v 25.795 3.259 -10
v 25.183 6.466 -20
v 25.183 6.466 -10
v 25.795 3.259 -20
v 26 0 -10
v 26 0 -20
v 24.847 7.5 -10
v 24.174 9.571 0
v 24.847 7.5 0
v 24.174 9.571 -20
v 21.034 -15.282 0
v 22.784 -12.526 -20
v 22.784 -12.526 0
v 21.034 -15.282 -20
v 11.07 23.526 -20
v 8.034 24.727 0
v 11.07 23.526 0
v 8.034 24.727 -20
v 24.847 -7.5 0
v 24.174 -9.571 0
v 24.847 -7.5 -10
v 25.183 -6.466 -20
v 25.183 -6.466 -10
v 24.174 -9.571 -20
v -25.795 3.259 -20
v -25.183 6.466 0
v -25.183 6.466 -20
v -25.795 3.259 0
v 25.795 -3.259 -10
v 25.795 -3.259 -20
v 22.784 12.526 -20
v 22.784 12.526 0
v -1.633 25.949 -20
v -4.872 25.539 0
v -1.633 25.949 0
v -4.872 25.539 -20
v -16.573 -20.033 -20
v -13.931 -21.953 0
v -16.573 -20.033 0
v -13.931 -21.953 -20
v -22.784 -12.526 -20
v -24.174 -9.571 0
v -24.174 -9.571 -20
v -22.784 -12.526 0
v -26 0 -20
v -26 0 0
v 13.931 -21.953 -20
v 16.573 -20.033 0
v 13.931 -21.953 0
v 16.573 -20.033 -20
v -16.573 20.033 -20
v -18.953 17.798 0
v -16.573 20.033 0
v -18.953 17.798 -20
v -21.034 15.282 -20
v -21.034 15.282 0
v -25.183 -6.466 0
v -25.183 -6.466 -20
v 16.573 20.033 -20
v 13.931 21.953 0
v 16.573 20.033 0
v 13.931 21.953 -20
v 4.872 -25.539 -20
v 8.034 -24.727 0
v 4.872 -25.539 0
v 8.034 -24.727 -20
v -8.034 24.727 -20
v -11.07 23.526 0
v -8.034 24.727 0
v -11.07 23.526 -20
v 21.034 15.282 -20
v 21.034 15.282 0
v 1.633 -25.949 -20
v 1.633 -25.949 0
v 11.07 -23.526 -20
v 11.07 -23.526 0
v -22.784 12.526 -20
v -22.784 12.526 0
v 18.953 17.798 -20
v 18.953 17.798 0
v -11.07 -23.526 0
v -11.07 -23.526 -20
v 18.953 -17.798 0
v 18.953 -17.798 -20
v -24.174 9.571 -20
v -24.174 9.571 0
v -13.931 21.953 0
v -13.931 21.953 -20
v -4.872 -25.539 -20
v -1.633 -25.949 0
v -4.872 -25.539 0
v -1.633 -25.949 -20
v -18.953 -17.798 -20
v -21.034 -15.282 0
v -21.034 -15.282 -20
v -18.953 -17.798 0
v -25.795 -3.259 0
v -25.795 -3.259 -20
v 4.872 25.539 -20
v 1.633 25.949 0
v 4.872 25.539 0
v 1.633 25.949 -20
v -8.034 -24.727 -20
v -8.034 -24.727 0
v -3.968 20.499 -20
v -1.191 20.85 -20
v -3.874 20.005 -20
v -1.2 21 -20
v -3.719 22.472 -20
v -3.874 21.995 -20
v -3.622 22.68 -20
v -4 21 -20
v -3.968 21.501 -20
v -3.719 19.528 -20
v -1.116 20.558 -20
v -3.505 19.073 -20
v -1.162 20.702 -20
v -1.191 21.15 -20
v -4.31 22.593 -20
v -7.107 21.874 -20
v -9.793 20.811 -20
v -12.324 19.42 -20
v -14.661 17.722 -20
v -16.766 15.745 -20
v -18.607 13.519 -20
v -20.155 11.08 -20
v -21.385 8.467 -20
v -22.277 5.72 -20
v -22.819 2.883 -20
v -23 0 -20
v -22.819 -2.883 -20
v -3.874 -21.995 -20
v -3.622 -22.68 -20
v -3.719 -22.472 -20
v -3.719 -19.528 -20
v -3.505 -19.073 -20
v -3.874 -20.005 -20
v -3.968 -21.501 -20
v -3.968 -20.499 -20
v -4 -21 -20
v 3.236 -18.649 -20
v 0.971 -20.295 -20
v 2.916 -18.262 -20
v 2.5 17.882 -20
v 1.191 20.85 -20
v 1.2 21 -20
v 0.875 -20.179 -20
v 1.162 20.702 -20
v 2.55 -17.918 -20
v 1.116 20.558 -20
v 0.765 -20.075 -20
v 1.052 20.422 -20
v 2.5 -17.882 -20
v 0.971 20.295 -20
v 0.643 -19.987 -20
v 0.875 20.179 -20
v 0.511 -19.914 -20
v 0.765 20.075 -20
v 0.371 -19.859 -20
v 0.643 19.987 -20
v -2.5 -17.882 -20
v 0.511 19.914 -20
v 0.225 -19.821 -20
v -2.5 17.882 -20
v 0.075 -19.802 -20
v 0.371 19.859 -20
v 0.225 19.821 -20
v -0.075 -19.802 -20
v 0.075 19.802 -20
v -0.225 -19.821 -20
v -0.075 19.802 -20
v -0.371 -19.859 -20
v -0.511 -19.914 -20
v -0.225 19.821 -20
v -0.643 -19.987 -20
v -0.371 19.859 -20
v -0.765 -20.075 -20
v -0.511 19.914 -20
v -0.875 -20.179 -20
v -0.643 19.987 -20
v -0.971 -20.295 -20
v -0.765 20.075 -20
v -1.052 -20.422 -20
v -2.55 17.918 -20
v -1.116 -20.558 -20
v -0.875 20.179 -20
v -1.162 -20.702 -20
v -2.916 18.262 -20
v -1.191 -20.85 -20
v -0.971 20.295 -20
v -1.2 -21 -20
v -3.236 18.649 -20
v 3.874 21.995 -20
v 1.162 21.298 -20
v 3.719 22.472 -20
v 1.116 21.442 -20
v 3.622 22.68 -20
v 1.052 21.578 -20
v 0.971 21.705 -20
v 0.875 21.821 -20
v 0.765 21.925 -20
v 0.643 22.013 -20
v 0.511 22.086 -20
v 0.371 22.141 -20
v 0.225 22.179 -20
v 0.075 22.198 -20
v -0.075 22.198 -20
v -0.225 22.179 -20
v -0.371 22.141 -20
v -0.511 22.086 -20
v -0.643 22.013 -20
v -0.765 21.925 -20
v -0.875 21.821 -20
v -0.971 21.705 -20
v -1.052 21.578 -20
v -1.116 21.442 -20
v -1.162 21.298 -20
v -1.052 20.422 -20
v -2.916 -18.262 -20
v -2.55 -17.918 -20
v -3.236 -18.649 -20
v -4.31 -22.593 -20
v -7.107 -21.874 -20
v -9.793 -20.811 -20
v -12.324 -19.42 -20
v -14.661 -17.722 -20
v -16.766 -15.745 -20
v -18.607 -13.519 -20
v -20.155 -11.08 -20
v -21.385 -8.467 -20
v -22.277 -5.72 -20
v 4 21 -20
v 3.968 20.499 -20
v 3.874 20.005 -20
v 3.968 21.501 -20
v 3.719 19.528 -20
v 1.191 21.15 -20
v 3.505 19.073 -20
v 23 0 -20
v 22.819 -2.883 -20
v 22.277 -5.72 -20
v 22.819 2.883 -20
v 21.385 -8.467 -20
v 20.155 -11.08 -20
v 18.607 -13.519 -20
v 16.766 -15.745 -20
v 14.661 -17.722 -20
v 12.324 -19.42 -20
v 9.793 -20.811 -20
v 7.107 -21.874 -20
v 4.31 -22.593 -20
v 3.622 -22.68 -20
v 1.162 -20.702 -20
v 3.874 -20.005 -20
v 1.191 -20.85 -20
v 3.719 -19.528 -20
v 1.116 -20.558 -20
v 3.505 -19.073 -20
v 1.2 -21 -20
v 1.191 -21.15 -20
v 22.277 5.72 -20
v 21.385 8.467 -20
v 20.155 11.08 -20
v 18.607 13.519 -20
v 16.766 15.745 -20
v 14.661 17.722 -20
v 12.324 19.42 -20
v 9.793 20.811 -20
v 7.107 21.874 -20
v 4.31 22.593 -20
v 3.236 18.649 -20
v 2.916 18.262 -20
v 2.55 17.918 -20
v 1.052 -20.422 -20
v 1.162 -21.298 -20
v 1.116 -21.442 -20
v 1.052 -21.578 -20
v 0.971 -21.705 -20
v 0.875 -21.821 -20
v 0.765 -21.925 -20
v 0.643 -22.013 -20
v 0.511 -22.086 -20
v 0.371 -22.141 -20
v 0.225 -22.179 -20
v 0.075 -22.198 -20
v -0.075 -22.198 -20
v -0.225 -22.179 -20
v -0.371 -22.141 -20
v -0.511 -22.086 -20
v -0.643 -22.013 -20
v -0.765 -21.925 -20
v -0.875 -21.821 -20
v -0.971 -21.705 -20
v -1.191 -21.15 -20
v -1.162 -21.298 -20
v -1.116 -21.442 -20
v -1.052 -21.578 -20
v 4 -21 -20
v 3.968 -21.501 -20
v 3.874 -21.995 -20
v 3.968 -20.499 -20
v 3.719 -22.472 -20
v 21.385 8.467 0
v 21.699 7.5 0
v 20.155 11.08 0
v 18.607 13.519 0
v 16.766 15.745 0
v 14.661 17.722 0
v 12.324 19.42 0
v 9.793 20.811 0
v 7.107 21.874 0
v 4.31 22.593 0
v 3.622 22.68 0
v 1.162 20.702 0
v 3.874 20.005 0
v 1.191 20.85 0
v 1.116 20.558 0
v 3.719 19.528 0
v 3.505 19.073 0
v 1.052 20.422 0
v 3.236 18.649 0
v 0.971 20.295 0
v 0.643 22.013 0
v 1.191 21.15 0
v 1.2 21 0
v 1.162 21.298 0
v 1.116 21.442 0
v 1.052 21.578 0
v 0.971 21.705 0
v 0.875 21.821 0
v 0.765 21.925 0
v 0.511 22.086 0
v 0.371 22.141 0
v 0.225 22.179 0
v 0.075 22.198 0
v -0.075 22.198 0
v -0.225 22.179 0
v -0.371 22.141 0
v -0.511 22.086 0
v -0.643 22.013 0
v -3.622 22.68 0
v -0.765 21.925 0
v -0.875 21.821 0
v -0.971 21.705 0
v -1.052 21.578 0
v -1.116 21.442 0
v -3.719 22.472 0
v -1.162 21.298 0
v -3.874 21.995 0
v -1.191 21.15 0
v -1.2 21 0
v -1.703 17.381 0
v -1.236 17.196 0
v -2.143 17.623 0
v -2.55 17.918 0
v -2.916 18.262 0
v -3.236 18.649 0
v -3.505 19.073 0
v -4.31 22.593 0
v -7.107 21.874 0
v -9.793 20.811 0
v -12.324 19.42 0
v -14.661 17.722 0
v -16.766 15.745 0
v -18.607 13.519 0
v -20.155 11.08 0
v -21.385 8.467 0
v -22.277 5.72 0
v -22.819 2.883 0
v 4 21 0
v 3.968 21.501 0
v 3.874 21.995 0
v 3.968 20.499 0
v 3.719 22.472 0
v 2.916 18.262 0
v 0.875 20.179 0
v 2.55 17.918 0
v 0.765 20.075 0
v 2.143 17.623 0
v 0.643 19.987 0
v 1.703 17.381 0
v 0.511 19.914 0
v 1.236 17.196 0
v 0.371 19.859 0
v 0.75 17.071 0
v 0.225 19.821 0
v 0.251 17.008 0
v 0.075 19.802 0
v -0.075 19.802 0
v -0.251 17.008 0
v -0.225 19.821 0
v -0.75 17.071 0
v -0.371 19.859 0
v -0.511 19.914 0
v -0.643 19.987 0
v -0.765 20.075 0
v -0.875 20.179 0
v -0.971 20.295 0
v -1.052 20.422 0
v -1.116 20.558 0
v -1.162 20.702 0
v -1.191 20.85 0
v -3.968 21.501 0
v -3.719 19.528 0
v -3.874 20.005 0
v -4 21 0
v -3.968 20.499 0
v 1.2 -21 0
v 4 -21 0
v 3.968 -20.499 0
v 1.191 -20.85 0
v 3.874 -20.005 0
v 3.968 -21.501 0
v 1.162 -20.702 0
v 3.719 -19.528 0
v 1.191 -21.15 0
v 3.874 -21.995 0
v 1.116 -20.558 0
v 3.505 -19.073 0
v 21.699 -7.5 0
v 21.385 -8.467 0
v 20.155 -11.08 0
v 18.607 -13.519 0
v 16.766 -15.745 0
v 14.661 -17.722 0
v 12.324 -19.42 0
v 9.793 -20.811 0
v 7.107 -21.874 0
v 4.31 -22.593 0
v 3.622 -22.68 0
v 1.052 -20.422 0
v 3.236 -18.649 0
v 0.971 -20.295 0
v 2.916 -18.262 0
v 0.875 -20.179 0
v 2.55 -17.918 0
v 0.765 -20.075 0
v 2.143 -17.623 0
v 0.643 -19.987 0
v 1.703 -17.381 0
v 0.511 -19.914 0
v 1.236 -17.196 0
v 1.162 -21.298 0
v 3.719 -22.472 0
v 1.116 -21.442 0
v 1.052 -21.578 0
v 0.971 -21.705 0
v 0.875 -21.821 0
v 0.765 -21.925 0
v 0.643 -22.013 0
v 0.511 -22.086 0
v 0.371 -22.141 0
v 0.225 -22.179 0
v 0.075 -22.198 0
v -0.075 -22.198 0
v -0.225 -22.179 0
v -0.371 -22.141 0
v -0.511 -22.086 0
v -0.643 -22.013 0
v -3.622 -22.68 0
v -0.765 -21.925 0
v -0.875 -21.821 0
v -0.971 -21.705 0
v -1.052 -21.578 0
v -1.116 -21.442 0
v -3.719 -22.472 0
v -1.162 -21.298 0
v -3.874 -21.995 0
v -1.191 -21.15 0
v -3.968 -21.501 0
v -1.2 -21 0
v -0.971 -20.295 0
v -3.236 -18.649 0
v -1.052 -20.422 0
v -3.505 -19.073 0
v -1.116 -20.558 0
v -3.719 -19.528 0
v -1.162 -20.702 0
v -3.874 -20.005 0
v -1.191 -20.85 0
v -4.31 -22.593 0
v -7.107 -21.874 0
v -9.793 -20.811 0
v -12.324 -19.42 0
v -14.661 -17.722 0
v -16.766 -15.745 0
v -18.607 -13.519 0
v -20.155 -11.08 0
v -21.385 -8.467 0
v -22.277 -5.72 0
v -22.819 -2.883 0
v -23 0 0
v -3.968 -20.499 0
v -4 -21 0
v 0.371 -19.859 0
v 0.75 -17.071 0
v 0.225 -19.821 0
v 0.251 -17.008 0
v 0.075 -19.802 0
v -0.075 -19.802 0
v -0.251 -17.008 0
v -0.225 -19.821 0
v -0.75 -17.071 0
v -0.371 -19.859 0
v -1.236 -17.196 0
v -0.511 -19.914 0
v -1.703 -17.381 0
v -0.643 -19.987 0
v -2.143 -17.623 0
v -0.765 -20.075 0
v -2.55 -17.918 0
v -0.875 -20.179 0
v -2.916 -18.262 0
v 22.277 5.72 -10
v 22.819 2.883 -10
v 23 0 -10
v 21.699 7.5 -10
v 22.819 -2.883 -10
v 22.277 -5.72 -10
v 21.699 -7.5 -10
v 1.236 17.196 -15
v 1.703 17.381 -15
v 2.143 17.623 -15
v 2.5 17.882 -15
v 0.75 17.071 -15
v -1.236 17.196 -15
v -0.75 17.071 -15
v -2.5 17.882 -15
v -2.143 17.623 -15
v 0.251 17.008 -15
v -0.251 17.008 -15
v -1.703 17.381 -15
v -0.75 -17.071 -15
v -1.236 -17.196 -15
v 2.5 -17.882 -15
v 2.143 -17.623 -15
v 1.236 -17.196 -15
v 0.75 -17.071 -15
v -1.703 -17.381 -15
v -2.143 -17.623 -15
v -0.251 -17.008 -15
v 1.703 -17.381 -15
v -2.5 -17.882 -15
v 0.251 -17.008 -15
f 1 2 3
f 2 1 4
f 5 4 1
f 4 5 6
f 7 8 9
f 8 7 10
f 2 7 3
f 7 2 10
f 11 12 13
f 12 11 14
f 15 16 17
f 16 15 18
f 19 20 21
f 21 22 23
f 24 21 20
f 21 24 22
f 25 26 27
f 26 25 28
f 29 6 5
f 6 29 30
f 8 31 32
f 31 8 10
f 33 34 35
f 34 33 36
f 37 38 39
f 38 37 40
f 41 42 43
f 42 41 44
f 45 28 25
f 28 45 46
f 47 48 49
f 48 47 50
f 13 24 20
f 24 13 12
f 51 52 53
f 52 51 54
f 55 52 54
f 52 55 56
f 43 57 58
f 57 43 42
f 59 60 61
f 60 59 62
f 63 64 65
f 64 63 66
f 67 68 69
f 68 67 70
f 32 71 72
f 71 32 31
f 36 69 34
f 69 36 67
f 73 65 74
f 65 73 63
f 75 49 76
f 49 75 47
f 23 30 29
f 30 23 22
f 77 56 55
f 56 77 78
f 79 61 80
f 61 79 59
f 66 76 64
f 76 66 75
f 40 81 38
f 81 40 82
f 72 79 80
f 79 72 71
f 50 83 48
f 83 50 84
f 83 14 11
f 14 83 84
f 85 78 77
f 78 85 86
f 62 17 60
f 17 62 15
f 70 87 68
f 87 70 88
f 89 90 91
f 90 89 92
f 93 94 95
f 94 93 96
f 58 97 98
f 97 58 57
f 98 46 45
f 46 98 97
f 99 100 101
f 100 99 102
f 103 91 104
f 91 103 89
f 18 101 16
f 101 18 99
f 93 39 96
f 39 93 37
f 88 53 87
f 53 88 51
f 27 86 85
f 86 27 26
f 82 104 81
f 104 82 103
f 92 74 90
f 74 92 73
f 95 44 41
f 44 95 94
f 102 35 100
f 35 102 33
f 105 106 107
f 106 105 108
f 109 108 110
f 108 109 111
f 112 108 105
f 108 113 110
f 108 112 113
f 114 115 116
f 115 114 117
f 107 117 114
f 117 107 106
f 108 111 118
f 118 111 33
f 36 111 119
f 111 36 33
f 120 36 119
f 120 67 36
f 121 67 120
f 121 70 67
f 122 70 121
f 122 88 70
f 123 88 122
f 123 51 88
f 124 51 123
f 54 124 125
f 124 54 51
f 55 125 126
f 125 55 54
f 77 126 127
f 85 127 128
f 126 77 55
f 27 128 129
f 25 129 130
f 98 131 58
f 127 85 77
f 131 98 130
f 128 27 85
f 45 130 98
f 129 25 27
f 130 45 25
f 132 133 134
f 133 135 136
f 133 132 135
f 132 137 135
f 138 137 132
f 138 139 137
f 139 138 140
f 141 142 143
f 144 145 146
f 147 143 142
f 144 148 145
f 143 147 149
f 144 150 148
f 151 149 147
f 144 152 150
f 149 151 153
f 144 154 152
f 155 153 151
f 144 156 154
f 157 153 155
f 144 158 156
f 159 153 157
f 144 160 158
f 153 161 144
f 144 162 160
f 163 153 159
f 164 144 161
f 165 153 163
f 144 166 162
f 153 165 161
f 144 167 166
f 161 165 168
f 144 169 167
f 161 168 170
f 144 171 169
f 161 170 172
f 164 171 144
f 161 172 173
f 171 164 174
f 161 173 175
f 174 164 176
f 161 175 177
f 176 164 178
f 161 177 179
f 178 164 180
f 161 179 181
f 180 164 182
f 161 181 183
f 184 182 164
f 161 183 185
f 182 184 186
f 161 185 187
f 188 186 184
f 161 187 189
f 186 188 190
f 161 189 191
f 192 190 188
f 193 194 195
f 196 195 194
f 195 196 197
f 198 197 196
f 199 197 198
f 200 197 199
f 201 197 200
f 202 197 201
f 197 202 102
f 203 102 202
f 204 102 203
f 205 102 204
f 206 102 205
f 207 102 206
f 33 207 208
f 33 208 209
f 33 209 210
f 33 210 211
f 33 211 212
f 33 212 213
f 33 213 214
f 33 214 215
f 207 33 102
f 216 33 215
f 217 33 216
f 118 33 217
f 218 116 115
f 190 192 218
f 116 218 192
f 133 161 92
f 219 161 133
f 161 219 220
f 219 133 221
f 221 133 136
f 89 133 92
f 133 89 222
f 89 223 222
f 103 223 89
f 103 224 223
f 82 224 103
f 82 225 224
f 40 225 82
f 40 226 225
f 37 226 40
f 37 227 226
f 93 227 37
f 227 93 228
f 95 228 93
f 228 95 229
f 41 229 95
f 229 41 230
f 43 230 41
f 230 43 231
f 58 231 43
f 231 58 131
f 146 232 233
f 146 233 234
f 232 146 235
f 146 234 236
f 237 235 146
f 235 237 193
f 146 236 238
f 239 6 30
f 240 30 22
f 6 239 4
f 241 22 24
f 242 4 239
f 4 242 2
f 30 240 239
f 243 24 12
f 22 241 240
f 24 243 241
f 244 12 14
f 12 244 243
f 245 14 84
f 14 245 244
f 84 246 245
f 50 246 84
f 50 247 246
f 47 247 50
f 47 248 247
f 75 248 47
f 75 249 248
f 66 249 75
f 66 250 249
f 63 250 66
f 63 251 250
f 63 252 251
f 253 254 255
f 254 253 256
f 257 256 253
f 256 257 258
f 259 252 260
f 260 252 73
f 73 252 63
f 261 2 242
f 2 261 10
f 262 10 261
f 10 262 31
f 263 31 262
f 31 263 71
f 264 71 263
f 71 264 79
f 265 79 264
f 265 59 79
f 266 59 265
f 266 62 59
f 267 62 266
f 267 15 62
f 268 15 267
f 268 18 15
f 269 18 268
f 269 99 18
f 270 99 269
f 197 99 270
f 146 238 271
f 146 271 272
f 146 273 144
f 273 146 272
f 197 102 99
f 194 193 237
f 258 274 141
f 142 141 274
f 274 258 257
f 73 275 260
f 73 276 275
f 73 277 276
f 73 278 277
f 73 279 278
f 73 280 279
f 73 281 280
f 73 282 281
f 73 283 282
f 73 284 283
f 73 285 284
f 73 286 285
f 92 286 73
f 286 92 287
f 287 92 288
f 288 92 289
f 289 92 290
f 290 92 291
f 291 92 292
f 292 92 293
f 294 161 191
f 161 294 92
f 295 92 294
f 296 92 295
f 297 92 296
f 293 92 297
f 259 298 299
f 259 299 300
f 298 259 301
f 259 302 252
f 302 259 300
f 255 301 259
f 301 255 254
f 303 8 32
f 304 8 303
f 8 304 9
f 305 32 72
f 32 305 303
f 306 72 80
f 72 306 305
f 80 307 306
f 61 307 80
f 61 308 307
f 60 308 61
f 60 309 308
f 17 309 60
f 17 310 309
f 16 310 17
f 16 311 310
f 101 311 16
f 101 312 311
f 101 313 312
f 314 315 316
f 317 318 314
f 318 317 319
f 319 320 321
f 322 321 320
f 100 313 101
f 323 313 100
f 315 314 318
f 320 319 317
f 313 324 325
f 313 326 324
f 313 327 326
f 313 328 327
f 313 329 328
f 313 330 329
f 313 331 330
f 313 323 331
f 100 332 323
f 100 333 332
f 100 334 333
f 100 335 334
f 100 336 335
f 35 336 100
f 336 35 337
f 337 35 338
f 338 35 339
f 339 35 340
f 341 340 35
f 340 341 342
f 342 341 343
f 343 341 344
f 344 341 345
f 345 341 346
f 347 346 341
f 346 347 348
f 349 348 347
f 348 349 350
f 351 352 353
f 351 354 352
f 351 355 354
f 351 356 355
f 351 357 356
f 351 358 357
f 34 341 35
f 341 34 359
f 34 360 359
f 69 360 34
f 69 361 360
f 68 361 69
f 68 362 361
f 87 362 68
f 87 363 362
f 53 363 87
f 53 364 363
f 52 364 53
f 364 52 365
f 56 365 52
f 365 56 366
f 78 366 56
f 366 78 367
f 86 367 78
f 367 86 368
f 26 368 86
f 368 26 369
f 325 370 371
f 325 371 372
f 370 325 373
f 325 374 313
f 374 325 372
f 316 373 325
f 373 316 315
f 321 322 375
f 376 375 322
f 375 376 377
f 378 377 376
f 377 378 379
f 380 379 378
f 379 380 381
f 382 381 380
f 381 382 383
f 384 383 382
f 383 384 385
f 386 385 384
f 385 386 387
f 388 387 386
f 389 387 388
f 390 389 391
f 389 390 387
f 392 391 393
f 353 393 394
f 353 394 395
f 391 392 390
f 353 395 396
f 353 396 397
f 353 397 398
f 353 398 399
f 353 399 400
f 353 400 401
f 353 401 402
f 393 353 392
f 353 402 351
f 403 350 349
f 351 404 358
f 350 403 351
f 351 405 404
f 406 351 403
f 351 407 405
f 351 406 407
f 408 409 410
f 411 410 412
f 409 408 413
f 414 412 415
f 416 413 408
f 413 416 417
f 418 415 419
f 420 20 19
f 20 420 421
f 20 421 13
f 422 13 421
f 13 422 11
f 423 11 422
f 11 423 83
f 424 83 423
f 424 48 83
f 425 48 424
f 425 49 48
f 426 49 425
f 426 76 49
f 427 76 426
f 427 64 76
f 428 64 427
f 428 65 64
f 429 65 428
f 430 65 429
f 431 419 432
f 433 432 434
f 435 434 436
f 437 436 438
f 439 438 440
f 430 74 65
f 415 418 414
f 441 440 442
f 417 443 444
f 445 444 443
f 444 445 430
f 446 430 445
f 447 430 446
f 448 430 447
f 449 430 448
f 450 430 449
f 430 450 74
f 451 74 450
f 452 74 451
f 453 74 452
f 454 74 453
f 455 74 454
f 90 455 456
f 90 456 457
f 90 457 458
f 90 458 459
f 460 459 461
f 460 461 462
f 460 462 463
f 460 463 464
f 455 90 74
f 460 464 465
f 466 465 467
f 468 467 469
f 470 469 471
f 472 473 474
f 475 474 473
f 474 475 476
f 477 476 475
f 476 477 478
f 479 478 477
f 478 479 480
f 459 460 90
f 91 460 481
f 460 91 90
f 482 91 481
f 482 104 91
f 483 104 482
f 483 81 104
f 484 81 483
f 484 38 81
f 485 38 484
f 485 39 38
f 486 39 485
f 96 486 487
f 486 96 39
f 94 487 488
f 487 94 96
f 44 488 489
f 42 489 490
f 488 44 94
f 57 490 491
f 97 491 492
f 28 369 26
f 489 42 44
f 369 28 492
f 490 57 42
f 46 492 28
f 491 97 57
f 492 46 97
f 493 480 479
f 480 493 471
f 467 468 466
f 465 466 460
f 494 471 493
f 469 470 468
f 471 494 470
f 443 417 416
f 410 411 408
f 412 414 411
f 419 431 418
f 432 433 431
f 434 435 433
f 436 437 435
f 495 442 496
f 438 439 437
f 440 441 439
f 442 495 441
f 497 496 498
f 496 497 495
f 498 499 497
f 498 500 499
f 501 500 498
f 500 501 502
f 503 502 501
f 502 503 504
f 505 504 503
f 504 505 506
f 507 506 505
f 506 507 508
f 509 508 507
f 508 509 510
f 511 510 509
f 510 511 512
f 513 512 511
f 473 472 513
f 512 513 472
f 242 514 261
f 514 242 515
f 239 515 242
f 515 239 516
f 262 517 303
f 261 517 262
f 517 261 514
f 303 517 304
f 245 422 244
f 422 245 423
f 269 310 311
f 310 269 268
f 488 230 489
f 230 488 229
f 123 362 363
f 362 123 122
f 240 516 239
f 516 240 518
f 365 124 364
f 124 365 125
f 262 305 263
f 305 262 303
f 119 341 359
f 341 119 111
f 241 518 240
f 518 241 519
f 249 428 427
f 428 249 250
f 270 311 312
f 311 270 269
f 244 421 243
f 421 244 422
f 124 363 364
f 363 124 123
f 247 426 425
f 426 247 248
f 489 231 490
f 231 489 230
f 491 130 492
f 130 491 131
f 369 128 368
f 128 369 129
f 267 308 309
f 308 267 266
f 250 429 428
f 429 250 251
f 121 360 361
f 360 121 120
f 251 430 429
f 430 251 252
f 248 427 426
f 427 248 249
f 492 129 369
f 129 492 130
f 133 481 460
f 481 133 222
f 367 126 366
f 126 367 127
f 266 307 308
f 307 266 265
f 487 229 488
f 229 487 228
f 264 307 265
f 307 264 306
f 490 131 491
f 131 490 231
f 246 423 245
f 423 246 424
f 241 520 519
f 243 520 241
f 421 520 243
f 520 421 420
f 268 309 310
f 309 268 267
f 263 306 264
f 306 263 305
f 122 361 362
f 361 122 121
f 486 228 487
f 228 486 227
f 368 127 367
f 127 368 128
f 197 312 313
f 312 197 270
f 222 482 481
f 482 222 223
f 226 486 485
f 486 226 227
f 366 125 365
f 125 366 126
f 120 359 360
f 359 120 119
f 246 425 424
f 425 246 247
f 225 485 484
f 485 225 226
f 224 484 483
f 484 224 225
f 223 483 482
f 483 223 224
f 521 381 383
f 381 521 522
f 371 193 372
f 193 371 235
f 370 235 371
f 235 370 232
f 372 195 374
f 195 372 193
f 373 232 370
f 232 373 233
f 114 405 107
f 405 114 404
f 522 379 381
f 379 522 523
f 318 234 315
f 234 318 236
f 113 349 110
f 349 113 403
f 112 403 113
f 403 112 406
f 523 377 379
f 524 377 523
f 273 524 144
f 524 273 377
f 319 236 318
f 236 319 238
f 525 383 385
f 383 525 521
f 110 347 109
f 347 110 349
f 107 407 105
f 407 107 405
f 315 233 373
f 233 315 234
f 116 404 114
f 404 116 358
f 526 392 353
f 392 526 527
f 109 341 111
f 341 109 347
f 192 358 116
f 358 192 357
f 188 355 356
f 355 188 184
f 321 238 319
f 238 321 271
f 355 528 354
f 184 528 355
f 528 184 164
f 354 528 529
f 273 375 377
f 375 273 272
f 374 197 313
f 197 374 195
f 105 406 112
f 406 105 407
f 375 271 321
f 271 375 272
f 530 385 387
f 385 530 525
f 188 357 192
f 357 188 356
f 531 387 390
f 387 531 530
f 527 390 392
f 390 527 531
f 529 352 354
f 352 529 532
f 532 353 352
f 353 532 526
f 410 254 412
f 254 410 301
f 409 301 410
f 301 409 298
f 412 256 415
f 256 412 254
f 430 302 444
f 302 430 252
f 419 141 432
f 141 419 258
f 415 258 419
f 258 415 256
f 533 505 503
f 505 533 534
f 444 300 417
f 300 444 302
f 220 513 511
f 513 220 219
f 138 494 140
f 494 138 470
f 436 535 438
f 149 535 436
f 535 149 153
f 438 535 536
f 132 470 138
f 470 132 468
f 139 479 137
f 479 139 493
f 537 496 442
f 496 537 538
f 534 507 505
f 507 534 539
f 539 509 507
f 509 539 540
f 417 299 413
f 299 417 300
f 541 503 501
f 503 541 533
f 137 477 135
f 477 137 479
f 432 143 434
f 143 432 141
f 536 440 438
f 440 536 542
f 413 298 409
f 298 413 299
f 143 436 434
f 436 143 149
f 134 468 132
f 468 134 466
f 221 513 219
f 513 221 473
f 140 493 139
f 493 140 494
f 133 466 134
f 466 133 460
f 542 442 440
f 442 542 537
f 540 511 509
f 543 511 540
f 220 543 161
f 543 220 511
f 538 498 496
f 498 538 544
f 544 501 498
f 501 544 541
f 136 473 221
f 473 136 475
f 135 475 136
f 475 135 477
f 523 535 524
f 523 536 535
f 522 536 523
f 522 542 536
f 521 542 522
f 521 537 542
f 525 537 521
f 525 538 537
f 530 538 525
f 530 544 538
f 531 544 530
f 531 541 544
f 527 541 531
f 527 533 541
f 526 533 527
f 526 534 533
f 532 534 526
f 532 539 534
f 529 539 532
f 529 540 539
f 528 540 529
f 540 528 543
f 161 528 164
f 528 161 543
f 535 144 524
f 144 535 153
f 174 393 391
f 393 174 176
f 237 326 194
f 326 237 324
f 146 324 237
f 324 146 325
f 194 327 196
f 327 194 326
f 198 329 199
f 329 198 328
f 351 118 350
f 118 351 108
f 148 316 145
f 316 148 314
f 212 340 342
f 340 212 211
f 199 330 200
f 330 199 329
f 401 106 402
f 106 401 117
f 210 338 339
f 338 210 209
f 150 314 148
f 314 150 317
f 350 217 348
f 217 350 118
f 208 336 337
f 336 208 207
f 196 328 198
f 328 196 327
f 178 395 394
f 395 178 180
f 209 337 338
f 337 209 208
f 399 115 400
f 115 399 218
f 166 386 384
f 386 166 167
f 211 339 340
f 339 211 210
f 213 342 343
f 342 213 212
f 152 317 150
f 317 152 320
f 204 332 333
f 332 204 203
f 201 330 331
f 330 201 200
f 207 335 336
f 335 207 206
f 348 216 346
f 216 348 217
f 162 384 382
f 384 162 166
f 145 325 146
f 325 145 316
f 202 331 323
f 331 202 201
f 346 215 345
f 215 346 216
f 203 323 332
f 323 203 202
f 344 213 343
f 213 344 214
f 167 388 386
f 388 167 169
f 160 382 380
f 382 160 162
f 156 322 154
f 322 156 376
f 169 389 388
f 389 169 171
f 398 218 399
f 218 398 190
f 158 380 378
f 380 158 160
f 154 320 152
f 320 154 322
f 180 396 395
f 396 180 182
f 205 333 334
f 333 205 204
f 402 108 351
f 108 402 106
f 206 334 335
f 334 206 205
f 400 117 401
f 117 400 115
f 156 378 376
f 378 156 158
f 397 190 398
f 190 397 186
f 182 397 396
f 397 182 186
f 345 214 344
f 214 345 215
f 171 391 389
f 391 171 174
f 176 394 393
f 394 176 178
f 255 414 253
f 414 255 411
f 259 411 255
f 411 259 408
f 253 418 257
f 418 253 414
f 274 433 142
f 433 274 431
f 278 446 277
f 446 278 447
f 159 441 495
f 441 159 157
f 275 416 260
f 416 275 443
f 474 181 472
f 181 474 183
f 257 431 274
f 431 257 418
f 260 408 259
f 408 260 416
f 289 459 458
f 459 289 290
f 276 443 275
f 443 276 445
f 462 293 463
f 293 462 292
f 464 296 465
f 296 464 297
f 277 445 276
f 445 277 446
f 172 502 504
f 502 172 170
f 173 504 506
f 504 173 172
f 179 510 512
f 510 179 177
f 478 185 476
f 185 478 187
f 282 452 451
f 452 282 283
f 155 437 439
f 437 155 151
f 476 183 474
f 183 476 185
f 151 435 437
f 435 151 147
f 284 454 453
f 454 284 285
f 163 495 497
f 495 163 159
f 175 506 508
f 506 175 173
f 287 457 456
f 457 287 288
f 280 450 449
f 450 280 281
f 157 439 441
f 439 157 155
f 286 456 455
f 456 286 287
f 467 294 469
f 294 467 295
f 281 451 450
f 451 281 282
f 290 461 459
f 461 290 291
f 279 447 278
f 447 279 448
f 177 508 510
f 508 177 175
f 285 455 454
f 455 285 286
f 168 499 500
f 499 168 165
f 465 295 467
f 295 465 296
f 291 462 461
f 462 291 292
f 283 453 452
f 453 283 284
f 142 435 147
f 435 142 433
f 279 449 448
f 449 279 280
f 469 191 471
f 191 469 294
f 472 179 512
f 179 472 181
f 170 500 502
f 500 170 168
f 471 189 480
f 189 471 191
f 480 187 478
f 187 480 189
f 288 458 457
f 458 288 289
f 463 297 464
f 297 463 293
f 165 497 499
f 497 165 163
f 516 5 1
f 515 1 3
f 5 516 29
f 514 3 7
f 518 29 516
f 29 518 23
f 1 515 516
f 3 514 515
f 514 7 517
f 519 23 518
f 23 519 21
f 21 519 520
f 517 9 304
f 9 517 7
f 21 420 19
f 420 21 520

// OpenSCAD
$fn = 50;

podRadius = 52/2;
podDepth = 20;
podHoleRadius = 23;
bezelRadius = podRadius + 5;
bezelHeight = 10;

// Adafruit 1.8" display with EYESPI
boardWidth = 57;
boardDepth = 36;
boardThickness = 6.5;
holeX = 25.5;
holeY = 15;
cornerRadius = 6;

boltPosition = 21;

/*
// zio.cc 1.5"
screenWidth = 30;
screenDepth = 34;
screenThickness = 1.5;

boardWidth = 45;
boardDepth = 36;
boardThickness = 1;
*/

module top()
{
    difference() {
        hull() {
            translate([0, 0, bezelHeight / 2])
                cylinder(h = bezelHeight, r = bezelRadius, center = true);
            
            translate([holeX, holeY, bezelHeight / 2])
                cylinder(h = bezelHeight, r = cornerRadius, center = true);
            translate([-holeX, holeY, bezelHeight / 2])
                cylinder(h = bezelHeight, r = cornerRadius, center = true);
            translate([holeX, -holeY, bezelHeight / 2])
                cylinder(h = bezelHeight, r = cornerRadius, center = true);
            translate([-holeX, -holeY, bezelHeight / 2])
                cylinder(h = bezelHeight, r = cornerRadius, center = true);
        }
        
        translate([holeX, holeY, 0])
            cylinder(h = bezelHeight, r = 1, center = true);
        translate([-holeX, holeY, 0])
            cylinder(h = bezelHeight, r = 1, center = true);
        translate([holeX, -holeY, 0])
            cylinder(h = bezelHeight, r = 1, center = true);
        translate([-holeX, -holeY, 0])
            cylinder(h = bezelHeight, r = 1, center = true);
        
        // cutout
        translate([0, 0, 2.9])
            cube([boardWidth, 25, 6], center = true);

        // bolts
        translate([0, boltPosition, 0])
            cylinder(h = 100, r = 1.7, center = true);
        translate([0, -boltPosition, 0])
            cylinder(h = 100, r = 1.7, center = true);

        // bolt heads
        translate([0, boltPosition, 9])
            cylinder(h = 3, r = 2.5, center = true);
        translate([0, -boltPosition, 9])
            cylinder(h = 3, r = 2.5, center = true);

        // ribbon connector
        translate([0, 15, 3])
            cube([15, 6, 3], center = true);
    }    

}

module display()
{
    translate([0, 0, boardThickness / 2])
        cube([boardWidth, boardDepth, boardThickness], center = true);
}

module base()
{
    difference() {
        union () {
            // bolt bosses
            translate([0, boltPosition, -podDepth / 2])
                cylinder(h = podDepth, r = 4, center = true);
            translate([0, -boltPosition, -podDepth / 2])
                cylinder(h = podDepth, r = 4, center = true);
            
            // crossbar
            translate([0, 0, -podDepth + 2.5])
                rotate([0, 0, 90])
                cube([podRadius * 2 - 2, 5, 5], center = true);
            
            // sleeve
            difference(){
                union () {
                    translate([0, 0, -podDepth / 2])
                        cylinder(h = podDepth, r = podRadius, center = true);
                }
                cylinder (h = 100, r = podHoleRadius, center = true);
            }
        }
        
        // bolt holes
        translate([0, boltPosition, 0])
            cylinder(h = 100, r = 1.2, center = true);
        translate([0, -boltPosition, 0])
            cylinder(h = 100, r = 1.2, center = true);
        
        // USB-C port
        translate([boltPosition, 0, 0])
            cube([10,15,20], center = true);
    }
}

// You'll probably want to comment out the top() or bottom() to print them separately.
difference() {
    union () {
        //top();
        base();
    }
    translate([0, 0, 4])
        display();
}
